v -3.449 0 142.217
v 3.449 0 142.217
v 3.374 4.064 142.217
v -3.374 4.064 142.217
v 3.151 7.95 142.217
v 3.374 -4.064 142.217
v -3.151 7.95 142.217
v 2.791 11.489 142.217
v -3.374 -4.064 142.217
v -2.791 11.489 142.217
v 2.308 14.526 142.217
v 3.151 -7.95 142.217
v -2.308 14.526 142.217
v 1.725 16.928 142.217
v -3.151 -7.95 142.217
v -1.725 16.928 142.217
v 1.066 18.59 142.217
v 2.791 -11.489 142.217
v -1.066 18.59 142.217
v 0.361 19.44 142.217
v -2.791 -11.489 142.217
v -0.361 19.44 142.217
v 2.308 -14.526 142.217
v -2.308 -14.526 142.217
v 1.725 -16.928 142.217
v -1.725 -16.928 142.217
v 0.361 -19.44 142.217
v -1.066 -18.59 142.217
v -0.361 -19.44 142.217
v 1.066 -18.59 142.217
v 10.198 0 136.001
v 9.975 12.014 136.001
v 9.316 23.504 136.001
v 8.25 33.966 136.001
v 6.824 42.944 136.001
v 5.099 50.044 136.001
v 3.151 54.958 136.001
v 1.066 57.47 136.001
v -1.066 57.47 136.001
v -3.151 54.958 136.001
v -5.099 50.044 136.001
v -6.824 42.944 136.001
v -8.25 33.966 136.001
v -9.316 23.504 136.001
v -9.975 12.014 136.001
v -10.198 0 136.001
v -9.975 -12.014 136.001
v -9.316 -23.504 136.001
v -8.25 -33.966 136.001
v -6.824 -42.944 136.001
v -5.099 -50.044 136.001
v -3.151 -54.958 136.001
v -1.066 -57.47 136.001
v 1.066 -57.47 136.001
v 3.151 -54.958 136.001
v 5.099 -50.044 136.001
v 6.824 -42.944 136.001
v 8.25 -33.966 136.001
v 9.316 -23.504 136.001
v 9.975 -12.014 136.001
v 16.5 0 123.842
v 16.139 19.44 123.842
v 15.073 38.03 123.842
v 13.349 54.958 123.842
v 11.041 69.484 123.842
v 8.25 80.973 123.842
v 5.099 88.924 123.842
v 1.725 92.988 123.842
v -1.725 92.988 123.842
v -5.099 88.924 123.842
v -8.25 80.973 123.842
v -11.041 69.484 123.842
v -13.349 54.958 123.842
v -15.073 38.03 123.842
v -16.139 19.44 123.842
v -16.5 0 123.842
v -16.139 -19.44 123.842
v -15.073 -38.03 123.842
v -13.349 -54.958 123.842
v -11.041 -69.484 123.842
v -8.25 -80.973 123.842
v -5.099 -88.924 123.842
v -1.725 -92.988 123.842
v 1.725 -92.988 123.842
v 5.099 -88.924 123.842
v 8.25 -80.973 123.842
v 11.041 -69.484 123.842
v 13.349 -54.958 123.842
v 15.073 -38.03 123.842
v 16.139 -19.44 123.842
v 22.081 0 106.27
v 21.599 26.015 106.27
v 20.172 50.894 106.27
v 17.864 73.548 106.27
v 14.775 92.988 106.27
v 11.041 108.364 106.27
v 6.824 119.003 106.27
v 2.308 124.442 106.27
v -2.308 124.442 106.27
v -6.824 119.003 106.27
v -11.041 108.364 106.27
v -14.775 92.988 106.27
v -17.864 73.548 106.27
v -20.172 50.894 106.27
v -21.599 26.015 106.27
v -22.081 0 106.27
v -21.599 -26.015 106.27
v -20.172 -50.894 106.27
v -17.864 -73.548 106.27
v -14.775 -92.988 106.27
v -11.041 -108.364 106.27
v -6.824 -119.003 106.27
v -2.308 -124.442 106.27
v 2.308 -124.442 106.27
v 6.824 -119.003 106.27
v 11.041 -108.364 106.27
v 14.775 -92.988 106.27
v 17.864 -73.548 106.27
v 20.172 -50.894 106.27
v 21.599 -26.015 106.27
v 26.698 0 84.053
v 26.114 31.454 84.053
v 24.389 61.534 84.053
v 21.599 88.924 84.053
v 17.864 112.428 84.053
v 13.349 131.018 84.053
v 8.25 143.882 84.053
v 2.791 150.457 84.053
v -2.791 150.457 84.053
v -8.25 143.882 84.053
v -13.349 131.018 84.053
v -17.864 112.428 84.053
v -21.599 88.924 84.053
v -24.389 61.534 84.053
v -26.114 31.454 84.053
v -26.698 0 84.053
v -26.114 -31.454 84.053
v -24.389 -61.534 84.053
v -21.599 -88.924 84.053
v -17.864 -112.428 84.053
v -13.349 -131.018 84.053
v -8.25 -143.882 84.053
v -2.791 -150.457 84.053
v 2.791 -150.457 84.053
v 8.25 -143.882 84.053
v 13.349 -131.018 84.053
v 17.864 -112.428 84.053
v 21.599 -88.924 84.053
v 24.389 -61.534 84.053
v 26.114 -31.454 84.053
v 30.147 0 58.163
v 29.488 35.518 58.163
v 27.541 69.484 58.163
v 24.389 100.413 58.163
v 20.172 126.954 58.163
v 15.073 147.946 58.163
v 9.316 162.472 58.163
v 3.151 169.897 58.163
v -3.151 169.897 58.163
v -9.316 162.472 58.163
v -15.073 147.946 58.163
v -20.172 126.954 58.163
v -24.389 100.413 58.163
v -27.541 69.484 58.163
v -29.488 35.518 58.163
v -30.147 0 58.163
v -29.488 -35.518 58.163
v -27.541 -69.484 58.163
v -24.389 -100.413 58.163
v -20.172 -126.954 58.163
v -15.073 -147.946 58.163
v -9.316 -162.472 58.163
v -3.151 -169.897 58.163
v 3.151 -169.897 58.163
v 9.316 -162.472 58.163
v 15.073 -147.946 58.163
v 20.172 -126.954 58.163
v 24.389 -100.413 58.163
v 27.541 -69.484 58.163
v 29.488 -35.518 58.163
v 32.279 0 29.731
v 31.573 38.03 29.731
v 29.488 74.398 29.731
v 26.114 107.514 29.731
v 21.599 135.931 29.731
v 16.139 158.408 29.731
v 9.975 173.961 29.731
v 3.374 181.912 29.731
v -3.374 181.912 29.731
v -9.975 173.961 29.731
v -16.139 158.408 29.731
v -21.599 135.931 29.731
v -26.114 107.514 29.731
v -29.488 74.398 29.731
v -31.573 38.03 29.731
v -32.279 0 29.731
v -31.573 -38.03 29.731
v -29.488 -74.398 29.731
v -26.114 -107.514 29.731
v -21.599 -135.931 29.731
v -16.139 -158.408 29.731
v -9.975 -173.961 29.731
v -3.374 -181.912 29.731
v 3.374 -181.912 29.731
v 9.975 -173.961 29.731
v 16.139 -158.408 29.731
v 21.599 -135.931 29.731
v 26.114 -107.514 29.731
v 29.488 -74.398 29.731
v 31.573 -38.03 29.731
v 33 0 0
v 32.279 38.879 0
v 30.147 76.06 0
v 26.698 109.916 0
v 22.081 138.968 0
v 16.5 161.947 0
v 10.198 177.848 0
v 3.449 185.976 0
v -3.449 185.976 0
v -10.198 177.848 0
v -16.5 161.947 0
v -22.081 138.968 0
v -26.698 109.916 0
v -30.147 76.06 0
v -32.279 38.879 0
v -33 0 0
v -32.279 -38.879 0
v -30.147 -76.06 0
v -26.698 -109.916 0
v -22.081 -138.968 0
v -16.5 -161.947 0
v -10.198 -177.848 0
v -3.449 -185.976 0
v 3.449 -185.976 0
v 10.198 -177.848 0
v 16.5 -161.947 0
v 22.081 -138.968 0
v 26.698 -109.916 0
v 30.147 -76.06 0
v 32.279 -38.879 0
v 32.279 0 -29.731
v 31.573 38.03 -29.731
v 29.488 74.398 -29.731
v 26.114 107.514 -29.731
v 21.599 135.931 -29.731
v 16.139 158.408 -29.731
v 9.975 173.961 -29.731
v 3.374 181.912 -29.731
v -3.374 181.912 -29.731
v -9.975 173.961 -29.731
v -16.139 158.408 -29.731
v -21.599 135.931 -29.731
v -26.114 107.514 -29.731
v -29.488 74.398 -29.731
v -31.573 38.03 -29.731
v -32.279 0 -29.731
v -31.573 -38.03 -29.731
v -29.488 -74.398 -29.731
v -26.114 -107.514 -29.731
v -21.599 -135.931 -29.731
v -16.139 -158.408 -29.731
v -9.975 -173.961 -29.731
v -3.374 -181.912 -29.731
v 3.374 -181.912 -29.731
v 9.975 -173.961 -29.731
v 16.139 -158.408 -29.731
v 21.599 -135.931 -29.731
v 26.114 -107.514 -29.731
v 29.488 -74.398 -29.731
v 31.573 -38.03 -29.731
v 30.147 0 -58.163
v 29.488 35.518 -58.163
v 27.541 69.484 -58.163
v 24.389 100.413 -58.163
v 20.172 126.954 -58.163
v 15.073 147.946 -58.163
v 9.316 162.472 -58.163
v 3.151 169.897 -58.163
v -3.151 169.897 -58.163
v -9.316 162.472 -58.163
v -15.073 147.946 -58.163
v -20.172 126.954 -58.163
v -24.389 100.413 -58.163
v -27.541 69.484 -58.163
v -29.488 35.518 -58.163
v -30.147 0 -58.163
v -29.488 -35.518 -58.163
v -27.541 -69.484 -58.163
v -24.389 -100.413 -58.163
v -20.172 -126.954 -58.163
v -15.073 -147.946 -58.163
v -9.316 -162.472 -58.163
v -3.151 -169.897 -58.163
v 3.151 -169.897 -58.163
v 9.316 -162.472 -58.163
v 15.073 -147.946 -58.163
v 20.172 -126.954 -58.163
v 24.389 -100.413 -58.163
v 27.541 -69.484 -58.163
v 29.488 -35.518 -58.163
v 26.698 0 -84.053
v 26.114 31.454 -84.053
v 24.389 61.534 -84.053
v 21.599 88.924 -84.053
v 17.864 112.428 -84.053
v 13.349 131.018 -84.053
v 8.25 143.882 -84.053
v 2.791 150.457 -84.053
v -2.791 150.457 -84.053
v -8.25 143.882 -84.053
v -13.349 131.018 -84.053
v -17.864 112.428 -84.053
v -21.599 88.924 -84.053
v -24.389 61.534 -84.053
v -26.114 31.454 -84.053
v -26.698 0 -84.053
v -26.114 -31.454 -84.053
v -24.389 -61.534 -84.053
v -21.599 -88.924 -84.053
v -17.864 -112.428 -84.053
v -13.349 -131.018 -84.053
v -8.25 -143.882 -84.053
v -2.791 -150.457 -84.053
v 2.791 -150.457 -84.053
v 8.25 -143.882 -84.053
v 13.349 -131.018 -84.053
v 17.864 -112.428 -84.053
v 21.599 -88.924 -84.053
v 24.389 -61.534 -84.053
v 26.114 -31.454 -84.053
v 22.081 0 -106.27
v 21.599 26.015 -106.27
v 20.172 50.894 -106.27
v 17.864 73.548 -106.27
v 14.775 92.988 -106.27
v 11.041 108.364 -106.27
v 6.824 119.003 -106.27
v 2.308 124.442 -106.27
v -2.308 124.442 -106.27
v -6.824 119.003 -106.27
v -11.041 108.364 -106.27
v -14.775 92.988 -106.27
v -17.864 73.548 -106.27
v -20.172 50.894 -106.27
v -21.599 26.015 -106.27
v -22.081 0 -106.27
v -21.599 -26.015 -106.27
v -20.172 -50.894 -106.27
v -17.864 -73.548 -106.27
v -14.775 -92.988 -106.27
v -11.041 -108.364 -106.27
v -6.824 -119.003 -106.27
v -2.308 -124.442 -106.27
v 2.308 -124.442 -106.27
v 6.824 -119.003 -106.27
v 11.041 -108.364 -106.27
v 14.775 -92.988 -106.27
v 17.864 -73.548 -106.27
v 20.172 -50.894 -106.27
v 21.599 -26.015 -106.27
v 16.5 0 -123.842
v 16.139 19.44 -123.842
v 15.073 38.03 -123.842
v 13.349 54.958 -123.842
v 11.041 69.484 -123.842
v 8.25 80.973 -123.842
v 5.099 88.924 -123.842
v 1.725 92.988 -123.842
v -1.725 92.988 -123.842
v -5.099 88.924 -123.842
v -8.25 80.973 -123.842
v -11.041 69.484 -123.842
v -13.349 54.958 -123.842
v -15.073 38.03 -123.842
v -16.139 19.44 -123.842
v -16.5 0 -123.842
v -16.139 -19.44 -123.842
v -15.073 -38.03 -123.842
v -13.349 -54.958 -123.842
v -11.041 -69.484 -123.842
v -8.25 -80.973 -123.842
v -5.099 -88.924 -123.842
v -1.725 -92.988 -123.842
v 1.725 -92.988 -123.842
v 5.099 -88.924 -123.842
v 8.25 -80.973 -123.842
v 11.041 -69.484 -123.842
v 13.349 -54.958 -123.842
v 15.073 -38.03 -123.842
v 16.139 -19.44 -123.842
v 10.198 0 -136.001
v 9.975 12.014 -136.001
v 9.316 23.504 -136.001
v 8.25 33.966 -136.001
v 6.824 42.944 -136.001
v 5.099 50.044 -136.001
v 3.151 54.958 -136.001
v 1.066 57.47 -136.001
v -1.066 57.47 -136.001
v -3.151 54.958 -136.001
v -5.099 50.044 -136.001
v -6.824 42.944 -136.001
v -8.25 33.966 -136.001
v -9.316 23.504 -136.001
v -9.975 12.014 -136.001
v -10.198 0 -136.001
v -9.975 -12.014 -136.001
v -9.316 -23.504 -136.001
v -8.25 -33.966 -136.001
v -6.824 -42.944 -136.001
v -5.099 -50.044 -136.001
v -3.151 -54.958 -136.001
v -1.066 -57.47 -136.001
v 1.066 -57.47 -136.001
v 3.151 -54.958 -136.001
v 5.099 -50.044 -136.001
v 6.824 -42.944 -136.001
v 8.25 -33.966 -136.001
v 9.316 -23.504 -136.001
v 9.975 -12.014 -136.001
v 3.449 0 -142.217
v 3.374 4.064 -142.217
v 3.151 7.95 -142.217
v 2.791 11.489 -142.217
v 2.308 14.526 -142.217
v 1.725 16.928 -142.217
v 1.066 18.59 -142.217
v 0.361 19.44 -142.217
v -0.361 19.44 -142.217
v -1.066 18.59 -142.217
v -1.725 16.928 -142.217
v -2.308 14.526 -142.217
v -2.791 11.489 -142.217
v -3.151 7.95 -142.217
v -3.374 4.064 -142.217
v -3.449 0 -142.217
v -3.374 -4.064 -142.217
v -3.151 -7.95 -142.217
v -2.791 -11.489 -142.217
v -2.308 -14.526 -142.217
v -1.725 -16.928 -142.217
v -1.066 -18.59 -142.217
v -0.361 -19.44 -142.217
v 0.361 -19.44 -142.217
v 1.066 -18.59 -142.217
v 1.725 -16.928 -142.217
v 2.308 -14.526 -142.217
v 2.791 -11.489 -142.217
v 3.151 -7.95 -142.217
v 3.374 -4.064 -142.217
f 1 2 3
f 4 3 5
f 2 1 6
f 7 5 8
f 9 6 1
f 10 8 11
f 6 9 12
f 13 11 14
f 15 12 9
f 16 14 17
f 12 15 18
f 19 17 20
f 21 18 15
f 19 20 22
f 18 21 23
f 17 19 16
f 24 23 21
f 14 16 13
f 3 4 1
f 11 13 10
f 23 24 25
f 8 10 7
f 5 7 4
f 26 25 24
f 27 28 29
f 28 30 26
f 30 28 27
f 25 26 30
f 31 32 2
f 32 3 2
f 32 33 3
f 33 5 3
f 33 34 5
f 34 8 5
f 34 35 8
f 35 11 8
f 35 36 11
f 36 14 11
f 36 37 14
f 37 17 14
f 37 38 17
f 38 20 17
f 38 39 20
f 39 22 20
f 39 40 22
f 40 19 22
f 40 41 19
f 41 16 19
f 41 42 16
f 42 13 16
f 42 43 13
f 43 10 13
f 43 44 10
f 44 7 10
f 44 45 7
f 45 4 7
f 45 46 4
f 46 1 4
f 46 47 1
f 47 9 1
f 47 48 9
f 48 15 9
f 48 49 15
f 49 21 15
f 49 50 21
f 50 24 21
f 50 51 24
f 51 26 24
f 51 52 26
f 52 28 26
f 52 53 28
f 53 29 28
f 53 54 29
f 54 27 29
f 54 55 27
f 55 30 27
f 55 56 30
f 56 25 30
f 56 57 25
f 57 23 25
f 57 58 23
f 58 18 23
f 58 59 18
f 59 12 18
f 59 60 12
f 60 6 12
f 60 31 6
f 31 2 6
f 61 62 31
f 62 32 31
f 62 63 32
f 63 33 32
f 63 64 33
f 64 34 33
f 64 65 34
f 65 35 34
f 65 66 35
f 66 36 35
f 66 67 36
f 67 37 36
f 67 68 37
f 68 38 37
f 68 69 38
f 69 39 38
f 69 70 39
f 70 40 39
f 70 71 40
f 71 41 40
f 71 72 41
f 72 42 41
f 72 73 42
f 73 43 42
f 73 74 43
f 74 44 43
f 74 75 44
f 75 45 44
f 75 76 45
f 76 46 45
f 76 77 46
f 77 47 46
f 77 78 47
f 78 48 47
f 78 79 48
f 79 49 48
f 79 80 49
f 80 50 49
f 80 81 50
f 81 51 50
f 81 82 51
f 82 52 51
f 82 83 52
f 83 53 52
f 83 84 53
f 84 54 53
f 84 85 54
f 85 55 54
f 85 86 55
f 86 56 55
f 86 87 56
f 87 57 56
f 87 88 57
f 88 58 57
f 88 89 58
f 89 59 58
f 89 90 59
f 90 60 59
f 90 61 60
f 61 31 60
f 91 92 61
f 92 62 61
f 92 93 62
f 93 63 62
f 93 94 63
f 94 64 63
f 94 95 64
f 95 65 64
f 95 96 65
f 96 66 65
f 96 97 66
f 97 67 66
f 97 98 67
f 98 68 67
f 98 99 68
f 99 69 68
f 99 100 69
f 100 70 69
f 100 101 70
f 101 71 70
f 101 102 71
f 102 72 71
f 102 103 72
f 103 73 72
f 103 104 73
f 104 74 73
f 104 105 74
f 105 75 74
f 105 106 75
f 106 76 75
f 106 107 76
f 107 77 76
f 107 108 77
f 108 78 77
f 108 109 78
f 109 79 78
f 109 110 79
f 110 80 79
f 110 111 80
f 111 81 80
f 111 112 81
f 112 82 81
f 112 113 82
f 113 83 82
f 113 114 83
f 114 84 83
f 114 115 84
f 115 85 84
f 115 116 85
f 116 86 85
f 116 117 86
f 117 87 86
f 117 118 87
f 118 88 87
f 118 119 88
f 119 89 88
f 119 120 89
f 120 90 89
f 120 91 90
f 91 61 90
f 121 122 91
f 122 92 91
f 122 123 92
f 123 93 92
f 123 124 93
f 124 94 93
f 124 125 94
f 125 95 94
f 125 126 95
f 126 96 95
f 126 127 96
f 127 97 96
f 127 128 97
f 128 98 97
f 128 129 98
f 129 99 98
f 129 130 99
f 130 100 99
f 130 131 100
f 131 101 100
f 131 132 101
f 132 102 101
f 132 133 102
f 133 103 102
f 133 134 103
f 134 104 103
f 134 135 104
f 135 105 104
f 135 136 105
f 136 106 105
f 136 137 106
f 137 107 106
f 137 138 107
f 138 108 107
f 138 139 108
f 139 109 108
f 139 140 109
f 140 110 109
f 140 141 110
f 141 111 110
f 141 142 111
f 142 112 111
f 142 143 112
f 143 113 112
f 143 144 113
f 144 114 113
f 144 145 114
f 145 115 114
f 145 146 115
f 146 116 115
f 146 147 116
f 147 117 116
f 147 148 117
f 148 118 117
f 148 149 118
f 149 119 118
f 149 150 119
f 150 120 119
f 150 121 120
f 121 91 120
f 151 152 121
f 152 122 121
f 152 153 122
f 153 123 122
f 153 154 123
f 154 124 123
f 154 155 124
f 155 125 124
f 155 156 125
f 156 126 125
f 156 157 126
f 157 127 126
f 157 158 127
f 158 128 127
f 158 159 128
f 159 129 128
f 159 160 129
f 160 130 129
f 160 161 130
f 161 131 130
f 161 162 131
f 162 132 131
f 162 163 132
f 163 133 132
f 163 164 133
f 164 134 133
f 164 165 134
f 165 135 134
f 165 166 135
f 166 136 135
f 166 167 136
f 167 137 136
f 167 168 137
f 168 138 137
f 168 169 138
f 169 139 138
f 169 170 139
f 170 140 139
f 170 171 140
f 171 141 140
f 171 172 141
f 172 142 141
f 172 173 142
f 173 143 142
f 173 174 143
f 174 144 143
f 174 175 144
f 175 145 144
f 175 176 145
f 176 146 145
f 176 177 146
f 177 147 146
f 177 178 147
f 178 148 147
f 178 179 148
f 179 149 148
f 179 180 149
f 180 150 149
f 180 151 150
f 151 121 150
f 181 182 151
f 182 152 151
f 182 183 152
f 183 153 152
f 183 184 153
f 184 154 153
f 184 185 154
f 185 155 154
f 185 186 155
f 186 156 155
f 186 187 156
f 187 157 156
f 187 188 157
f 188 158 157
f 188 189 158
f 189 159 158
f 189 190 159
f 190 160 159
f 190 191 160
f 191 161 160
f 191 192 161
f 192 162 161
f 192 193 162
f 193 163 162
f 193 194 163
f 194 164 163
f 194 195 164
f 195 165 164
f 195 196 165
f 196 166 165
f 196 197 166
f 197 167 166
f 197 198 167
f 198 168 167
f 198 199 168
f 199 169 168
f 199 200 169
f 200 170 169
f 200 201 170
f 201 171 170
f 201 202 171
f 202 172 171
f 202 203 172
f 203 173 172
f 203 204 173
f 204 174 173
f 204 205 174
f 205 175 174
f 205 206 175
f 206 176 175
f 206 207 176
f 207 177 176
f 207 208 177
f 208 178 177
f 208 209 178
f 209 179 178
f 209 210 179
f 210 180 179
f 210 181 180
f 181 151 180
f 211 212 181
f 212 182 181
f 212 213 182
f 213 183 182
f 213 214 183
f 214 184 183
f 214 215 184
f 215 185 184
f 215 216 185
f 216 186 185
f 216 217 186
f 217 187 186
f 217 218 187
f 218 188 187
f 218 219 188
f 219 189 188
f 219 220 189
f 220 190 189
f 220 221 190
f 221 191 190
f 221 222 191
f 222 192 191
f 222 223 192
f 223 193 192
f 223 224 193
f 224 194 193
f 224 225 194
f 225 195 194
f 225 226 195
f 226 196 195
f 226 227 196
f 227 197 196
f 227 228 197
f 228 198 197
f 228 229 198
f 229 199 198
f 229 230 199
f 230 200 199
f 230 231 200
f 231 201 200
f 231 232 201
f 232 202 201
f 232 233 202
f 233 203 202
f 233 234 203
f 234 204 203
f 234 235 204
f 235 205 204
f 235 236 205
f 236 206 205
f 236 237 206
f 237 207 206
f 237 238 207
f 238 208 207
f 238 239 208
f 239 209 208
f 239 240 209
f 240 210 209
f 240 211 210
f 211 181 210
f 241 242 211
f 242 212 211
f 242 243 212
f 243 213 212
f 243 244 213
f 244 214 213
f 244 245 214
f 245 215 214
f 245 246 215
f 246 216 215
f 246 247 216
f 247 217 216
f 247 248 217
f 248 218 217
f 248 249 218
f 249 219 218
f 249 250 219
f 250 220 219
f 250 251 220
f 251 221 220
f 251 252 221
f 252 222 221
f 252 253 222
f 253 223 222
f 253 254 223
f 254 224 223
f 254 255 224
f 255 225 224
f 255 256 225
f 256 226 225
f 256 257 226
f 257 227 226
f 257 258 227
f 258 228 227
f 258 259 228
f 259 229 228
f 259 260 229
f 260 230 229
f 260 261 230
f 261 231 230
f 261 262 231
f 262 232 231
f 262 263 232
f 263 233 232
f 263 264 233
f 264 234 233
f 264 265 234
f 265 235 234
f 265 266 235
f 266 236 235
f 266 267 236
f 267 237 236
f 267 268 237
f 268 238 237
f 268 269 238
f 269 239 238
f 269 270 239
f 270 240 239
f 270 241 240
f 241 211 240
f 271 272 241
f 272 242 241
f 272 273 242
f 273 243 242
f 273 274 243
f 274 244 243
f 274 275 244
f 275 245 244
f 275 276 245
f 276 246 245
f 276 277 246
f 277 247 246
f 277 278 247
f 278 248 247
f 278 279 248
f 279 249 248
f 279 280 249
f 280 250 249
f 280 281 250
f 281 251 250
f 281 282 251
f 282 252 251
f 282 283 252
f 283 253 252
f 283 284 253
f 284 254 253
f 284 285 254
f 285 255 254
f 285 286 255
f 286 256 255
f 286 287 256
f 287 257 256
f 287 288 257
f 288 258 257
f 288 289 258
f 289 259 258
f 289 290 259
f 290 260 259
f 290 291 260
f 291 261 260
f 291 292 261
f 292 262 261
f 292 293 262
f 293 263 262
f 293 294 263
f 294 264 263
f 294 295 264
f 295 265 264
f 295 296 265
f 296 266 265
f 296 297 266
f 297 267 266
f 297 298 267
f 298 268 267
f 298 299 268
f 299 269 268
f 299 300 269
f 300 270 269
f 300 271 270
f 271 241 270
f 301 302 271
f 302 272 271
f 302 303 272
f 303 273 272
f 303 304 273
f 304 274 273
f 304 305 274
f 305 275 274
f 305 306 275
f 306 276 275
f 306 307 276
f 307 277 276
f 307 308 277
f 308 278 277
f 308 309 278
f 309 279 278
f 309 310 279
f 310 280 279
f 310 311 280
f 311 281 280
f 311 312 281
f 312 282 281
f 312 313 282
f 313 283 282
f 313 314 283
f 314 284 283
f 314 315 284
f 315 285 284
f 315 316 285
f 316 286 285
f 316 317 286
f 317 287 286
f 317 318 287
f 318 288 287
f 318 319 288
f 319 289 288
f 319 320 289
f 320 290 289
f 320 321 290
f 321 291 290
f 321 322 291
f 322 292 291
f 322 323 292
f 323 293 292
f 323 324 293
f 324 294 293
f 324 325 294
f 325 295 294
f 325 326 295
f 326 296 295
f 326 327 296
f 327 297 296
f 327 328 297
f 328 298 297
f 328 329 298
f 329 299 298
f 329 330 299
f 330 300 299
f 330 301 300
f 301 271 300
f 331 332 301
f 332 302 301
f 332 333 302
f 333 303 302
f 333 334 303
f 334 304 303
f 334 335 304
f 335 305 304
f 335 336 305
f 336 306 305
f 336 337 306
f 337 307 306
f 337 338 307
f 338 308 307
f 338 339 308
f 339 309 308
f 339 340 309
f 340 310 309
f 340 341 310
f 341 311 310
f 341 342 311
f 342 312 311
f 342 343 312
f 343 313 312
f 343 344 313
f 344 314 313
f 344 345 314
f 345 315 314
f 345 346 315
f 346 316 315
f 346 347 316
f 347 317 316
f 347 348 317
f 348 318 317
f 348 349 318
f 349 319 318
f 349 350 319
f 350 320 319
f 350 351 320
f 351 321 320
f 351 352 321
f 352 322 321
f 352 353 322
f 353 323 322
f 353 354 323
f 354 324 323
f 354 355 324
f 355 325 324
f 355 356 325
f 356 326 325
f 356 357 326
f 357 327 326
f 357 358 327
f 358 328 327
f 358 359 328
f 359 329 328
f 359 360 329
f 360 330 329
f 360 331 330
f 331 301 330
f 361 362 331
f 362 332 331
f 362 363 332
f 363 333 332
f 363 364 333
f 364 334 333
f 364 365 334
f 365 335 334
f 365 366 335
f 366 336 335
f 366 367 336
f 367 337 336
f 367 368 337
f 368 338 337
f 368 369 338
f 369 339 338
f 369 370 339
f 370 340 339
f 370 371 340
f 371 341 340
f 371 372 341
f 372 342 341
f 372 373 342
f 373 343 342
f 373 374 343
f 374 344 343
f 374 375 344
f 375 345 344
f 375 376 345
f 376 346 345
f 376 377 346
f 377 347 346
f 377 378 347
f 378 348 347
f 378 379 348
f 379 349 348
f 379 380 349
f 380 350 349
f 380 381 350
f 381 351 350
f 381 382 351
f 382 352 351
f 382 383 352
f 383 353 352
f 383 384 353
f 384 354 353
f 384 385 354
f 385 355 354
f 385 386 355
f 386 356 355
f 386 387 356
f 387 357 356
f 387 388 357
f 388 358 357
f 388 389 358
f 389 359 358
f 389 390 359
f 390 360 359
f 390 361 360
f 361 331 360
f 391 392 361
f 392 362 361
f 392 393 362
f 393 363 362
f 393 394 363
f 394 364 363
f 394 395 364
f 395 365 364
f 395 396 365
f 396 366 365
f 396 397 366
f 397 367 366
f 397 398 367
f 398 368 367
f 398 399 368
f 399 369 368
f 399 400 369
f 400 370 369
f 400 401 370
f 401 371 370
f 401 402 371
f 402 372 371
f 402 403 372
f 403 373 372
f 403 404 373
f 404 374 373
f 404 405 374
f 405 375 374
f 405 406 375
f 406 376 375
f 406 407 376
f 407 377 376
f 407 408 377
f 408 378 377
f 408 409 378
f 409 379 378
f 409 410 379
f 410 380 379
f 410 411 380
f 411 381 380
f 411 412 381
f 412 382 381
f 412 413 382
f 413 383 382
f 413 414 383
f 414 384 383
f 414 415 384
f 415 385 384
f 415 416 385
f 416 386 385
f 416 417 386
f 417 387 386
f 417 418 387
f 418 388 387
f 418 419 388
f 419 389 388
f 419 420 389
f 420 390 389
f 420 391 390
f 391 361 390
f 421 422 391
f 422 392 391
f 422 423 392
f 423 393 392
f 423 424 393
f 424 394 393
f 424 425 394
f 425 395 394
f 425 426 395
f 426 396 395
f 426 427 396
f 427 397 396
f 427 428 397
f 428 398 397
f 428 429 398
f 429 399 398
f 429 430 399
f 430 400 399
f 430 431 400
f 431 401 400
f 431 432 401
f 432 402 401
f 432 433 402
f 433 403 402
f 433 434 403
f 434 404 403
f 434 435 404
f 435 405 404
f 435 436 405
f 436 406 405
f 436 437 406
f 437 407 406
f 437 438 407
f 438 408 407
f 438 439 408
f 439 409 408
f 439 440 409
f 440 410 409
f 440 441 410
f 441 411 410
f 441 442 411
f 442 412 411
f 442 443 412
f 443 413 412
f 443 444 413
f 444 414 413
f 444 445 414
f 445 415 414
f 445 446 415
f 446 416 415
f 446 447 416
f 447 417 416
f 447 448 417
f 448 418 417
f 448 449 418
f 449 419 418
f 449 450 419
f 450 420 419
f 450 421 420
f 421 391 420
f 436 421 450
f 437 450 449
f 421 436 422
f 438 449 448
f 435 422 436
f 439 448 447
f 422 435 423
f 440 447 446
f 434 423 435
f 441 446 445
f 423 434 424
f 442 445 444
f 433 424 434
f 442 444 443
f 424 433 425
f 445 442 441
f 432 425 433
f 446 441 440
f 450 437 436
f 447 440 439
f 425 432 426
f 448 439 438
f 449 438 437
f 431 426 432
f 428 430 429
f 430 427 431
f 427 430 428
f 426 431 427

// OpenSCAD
// Generated by SolidPython 1.0.1 on 2020-07-29 00:46:46


scale(v = [3, 17, 13]) {
	sphere(r = 11);
}
/***********************************************
*********      SolidPython code:      **********
************************************************
 
# import packages: SolidPython
from solid import *
from solid.utils import *
from itertools import chain, combinations, permutations


class Resize:

    def __init__(self, scad_file):
        self.scad_file = scad_file
        #self.scad_file = import_scad(scad_file)
        # cone/cylinder param:
        self.r1 = 0
        self.r2 = 0
        self.h = 0
        # rectangular prism param:
        self.w = 0
        self.l = 0
        # ellipse param:
        self.r = 0

    # import OpenScad code (file name corresponds to shape)


    # classify shape + parameters
    def assign(self, param1, param2, param3):
        if self.scad_file == 'cone.scad':
            self.r1 = param1
            self.r2 = param2
            self.h = param3
        elif self.scad_file == 'cylinder.scad':
            self.r1 = param1
            self.r2 = param2
            self.h = param3
        elif self.scad_file == 'rectangularPrism.scad':
            self.h = param1
            self.l = param2
            self.w = param3
        else:
            self.r = param1
            self.h = param2

    # resize parameters
    def iterate(self):
        x = range(3, 20, 2)
        i = 1
        if self.scad_file == 'cone.scad':
            tempList = list(permutations(x, 2))
            for temp in tempList:
                param1 = temp[0]
                param2 = temp[1]
                filepath = 'produced_scad_files/' + 'cone' + str(param1) + '_' + str(param2) + '_' + '.scad'
                scad_render_to_file(cylinder(h=param1, r1=param2, r2=0), filepath)

        elif self.scad_file == 'cylinder.scad':
            tempList = list(permutations(x, 3))
            for temp in tempList:
                param1 = temp[0]
                param2 = temp[1]
                filepath = 'produced_scad_files/' + 'cylinder' + str(param1) + '_' + str(param2) + '_' + '.scad'
                scad_render_to_file(cylinder(h=param1, r1=param2, r2=param2), filepath)

        elif self.scad_file == 'rectangularPrism.scad':
            tempList = list(permutations(x, 3))
            for temp in tempList:
                param1 = temp[0]
                param2 = temp[1]
                param3 = temp[2]
                filepath = 'produced_scad_files/' + 'rectangularPrism' + str(param1) + '_' + str(param2) + '_' + str(
                    param3) + '.scad'
                scad_render_to_file(cube(size=(param1, param2, param3)), filepath)

        elif self.scad_file == 'ellipse.scad':
            tempList = list(permutations(x, 4))
            for temp in tempList:
                param1 = temp[0]
                param2 = temp[1]
                param3 = temp[2]
                param4 = temp[3]
                filepath = 'produced_scad_files/' + 'ellipse' + str(param1) + '_' + str(param2) + '_' + str(param3) + '_' + str(param4) + '.scad'
                scad_render_to_file(scale([param1, param2, param3])(sphere(r=param4)), filepath)

    def render_to_scadfile(self):
        scad_render_to_file(scad, 'example.scad') 
 
************************************************/
